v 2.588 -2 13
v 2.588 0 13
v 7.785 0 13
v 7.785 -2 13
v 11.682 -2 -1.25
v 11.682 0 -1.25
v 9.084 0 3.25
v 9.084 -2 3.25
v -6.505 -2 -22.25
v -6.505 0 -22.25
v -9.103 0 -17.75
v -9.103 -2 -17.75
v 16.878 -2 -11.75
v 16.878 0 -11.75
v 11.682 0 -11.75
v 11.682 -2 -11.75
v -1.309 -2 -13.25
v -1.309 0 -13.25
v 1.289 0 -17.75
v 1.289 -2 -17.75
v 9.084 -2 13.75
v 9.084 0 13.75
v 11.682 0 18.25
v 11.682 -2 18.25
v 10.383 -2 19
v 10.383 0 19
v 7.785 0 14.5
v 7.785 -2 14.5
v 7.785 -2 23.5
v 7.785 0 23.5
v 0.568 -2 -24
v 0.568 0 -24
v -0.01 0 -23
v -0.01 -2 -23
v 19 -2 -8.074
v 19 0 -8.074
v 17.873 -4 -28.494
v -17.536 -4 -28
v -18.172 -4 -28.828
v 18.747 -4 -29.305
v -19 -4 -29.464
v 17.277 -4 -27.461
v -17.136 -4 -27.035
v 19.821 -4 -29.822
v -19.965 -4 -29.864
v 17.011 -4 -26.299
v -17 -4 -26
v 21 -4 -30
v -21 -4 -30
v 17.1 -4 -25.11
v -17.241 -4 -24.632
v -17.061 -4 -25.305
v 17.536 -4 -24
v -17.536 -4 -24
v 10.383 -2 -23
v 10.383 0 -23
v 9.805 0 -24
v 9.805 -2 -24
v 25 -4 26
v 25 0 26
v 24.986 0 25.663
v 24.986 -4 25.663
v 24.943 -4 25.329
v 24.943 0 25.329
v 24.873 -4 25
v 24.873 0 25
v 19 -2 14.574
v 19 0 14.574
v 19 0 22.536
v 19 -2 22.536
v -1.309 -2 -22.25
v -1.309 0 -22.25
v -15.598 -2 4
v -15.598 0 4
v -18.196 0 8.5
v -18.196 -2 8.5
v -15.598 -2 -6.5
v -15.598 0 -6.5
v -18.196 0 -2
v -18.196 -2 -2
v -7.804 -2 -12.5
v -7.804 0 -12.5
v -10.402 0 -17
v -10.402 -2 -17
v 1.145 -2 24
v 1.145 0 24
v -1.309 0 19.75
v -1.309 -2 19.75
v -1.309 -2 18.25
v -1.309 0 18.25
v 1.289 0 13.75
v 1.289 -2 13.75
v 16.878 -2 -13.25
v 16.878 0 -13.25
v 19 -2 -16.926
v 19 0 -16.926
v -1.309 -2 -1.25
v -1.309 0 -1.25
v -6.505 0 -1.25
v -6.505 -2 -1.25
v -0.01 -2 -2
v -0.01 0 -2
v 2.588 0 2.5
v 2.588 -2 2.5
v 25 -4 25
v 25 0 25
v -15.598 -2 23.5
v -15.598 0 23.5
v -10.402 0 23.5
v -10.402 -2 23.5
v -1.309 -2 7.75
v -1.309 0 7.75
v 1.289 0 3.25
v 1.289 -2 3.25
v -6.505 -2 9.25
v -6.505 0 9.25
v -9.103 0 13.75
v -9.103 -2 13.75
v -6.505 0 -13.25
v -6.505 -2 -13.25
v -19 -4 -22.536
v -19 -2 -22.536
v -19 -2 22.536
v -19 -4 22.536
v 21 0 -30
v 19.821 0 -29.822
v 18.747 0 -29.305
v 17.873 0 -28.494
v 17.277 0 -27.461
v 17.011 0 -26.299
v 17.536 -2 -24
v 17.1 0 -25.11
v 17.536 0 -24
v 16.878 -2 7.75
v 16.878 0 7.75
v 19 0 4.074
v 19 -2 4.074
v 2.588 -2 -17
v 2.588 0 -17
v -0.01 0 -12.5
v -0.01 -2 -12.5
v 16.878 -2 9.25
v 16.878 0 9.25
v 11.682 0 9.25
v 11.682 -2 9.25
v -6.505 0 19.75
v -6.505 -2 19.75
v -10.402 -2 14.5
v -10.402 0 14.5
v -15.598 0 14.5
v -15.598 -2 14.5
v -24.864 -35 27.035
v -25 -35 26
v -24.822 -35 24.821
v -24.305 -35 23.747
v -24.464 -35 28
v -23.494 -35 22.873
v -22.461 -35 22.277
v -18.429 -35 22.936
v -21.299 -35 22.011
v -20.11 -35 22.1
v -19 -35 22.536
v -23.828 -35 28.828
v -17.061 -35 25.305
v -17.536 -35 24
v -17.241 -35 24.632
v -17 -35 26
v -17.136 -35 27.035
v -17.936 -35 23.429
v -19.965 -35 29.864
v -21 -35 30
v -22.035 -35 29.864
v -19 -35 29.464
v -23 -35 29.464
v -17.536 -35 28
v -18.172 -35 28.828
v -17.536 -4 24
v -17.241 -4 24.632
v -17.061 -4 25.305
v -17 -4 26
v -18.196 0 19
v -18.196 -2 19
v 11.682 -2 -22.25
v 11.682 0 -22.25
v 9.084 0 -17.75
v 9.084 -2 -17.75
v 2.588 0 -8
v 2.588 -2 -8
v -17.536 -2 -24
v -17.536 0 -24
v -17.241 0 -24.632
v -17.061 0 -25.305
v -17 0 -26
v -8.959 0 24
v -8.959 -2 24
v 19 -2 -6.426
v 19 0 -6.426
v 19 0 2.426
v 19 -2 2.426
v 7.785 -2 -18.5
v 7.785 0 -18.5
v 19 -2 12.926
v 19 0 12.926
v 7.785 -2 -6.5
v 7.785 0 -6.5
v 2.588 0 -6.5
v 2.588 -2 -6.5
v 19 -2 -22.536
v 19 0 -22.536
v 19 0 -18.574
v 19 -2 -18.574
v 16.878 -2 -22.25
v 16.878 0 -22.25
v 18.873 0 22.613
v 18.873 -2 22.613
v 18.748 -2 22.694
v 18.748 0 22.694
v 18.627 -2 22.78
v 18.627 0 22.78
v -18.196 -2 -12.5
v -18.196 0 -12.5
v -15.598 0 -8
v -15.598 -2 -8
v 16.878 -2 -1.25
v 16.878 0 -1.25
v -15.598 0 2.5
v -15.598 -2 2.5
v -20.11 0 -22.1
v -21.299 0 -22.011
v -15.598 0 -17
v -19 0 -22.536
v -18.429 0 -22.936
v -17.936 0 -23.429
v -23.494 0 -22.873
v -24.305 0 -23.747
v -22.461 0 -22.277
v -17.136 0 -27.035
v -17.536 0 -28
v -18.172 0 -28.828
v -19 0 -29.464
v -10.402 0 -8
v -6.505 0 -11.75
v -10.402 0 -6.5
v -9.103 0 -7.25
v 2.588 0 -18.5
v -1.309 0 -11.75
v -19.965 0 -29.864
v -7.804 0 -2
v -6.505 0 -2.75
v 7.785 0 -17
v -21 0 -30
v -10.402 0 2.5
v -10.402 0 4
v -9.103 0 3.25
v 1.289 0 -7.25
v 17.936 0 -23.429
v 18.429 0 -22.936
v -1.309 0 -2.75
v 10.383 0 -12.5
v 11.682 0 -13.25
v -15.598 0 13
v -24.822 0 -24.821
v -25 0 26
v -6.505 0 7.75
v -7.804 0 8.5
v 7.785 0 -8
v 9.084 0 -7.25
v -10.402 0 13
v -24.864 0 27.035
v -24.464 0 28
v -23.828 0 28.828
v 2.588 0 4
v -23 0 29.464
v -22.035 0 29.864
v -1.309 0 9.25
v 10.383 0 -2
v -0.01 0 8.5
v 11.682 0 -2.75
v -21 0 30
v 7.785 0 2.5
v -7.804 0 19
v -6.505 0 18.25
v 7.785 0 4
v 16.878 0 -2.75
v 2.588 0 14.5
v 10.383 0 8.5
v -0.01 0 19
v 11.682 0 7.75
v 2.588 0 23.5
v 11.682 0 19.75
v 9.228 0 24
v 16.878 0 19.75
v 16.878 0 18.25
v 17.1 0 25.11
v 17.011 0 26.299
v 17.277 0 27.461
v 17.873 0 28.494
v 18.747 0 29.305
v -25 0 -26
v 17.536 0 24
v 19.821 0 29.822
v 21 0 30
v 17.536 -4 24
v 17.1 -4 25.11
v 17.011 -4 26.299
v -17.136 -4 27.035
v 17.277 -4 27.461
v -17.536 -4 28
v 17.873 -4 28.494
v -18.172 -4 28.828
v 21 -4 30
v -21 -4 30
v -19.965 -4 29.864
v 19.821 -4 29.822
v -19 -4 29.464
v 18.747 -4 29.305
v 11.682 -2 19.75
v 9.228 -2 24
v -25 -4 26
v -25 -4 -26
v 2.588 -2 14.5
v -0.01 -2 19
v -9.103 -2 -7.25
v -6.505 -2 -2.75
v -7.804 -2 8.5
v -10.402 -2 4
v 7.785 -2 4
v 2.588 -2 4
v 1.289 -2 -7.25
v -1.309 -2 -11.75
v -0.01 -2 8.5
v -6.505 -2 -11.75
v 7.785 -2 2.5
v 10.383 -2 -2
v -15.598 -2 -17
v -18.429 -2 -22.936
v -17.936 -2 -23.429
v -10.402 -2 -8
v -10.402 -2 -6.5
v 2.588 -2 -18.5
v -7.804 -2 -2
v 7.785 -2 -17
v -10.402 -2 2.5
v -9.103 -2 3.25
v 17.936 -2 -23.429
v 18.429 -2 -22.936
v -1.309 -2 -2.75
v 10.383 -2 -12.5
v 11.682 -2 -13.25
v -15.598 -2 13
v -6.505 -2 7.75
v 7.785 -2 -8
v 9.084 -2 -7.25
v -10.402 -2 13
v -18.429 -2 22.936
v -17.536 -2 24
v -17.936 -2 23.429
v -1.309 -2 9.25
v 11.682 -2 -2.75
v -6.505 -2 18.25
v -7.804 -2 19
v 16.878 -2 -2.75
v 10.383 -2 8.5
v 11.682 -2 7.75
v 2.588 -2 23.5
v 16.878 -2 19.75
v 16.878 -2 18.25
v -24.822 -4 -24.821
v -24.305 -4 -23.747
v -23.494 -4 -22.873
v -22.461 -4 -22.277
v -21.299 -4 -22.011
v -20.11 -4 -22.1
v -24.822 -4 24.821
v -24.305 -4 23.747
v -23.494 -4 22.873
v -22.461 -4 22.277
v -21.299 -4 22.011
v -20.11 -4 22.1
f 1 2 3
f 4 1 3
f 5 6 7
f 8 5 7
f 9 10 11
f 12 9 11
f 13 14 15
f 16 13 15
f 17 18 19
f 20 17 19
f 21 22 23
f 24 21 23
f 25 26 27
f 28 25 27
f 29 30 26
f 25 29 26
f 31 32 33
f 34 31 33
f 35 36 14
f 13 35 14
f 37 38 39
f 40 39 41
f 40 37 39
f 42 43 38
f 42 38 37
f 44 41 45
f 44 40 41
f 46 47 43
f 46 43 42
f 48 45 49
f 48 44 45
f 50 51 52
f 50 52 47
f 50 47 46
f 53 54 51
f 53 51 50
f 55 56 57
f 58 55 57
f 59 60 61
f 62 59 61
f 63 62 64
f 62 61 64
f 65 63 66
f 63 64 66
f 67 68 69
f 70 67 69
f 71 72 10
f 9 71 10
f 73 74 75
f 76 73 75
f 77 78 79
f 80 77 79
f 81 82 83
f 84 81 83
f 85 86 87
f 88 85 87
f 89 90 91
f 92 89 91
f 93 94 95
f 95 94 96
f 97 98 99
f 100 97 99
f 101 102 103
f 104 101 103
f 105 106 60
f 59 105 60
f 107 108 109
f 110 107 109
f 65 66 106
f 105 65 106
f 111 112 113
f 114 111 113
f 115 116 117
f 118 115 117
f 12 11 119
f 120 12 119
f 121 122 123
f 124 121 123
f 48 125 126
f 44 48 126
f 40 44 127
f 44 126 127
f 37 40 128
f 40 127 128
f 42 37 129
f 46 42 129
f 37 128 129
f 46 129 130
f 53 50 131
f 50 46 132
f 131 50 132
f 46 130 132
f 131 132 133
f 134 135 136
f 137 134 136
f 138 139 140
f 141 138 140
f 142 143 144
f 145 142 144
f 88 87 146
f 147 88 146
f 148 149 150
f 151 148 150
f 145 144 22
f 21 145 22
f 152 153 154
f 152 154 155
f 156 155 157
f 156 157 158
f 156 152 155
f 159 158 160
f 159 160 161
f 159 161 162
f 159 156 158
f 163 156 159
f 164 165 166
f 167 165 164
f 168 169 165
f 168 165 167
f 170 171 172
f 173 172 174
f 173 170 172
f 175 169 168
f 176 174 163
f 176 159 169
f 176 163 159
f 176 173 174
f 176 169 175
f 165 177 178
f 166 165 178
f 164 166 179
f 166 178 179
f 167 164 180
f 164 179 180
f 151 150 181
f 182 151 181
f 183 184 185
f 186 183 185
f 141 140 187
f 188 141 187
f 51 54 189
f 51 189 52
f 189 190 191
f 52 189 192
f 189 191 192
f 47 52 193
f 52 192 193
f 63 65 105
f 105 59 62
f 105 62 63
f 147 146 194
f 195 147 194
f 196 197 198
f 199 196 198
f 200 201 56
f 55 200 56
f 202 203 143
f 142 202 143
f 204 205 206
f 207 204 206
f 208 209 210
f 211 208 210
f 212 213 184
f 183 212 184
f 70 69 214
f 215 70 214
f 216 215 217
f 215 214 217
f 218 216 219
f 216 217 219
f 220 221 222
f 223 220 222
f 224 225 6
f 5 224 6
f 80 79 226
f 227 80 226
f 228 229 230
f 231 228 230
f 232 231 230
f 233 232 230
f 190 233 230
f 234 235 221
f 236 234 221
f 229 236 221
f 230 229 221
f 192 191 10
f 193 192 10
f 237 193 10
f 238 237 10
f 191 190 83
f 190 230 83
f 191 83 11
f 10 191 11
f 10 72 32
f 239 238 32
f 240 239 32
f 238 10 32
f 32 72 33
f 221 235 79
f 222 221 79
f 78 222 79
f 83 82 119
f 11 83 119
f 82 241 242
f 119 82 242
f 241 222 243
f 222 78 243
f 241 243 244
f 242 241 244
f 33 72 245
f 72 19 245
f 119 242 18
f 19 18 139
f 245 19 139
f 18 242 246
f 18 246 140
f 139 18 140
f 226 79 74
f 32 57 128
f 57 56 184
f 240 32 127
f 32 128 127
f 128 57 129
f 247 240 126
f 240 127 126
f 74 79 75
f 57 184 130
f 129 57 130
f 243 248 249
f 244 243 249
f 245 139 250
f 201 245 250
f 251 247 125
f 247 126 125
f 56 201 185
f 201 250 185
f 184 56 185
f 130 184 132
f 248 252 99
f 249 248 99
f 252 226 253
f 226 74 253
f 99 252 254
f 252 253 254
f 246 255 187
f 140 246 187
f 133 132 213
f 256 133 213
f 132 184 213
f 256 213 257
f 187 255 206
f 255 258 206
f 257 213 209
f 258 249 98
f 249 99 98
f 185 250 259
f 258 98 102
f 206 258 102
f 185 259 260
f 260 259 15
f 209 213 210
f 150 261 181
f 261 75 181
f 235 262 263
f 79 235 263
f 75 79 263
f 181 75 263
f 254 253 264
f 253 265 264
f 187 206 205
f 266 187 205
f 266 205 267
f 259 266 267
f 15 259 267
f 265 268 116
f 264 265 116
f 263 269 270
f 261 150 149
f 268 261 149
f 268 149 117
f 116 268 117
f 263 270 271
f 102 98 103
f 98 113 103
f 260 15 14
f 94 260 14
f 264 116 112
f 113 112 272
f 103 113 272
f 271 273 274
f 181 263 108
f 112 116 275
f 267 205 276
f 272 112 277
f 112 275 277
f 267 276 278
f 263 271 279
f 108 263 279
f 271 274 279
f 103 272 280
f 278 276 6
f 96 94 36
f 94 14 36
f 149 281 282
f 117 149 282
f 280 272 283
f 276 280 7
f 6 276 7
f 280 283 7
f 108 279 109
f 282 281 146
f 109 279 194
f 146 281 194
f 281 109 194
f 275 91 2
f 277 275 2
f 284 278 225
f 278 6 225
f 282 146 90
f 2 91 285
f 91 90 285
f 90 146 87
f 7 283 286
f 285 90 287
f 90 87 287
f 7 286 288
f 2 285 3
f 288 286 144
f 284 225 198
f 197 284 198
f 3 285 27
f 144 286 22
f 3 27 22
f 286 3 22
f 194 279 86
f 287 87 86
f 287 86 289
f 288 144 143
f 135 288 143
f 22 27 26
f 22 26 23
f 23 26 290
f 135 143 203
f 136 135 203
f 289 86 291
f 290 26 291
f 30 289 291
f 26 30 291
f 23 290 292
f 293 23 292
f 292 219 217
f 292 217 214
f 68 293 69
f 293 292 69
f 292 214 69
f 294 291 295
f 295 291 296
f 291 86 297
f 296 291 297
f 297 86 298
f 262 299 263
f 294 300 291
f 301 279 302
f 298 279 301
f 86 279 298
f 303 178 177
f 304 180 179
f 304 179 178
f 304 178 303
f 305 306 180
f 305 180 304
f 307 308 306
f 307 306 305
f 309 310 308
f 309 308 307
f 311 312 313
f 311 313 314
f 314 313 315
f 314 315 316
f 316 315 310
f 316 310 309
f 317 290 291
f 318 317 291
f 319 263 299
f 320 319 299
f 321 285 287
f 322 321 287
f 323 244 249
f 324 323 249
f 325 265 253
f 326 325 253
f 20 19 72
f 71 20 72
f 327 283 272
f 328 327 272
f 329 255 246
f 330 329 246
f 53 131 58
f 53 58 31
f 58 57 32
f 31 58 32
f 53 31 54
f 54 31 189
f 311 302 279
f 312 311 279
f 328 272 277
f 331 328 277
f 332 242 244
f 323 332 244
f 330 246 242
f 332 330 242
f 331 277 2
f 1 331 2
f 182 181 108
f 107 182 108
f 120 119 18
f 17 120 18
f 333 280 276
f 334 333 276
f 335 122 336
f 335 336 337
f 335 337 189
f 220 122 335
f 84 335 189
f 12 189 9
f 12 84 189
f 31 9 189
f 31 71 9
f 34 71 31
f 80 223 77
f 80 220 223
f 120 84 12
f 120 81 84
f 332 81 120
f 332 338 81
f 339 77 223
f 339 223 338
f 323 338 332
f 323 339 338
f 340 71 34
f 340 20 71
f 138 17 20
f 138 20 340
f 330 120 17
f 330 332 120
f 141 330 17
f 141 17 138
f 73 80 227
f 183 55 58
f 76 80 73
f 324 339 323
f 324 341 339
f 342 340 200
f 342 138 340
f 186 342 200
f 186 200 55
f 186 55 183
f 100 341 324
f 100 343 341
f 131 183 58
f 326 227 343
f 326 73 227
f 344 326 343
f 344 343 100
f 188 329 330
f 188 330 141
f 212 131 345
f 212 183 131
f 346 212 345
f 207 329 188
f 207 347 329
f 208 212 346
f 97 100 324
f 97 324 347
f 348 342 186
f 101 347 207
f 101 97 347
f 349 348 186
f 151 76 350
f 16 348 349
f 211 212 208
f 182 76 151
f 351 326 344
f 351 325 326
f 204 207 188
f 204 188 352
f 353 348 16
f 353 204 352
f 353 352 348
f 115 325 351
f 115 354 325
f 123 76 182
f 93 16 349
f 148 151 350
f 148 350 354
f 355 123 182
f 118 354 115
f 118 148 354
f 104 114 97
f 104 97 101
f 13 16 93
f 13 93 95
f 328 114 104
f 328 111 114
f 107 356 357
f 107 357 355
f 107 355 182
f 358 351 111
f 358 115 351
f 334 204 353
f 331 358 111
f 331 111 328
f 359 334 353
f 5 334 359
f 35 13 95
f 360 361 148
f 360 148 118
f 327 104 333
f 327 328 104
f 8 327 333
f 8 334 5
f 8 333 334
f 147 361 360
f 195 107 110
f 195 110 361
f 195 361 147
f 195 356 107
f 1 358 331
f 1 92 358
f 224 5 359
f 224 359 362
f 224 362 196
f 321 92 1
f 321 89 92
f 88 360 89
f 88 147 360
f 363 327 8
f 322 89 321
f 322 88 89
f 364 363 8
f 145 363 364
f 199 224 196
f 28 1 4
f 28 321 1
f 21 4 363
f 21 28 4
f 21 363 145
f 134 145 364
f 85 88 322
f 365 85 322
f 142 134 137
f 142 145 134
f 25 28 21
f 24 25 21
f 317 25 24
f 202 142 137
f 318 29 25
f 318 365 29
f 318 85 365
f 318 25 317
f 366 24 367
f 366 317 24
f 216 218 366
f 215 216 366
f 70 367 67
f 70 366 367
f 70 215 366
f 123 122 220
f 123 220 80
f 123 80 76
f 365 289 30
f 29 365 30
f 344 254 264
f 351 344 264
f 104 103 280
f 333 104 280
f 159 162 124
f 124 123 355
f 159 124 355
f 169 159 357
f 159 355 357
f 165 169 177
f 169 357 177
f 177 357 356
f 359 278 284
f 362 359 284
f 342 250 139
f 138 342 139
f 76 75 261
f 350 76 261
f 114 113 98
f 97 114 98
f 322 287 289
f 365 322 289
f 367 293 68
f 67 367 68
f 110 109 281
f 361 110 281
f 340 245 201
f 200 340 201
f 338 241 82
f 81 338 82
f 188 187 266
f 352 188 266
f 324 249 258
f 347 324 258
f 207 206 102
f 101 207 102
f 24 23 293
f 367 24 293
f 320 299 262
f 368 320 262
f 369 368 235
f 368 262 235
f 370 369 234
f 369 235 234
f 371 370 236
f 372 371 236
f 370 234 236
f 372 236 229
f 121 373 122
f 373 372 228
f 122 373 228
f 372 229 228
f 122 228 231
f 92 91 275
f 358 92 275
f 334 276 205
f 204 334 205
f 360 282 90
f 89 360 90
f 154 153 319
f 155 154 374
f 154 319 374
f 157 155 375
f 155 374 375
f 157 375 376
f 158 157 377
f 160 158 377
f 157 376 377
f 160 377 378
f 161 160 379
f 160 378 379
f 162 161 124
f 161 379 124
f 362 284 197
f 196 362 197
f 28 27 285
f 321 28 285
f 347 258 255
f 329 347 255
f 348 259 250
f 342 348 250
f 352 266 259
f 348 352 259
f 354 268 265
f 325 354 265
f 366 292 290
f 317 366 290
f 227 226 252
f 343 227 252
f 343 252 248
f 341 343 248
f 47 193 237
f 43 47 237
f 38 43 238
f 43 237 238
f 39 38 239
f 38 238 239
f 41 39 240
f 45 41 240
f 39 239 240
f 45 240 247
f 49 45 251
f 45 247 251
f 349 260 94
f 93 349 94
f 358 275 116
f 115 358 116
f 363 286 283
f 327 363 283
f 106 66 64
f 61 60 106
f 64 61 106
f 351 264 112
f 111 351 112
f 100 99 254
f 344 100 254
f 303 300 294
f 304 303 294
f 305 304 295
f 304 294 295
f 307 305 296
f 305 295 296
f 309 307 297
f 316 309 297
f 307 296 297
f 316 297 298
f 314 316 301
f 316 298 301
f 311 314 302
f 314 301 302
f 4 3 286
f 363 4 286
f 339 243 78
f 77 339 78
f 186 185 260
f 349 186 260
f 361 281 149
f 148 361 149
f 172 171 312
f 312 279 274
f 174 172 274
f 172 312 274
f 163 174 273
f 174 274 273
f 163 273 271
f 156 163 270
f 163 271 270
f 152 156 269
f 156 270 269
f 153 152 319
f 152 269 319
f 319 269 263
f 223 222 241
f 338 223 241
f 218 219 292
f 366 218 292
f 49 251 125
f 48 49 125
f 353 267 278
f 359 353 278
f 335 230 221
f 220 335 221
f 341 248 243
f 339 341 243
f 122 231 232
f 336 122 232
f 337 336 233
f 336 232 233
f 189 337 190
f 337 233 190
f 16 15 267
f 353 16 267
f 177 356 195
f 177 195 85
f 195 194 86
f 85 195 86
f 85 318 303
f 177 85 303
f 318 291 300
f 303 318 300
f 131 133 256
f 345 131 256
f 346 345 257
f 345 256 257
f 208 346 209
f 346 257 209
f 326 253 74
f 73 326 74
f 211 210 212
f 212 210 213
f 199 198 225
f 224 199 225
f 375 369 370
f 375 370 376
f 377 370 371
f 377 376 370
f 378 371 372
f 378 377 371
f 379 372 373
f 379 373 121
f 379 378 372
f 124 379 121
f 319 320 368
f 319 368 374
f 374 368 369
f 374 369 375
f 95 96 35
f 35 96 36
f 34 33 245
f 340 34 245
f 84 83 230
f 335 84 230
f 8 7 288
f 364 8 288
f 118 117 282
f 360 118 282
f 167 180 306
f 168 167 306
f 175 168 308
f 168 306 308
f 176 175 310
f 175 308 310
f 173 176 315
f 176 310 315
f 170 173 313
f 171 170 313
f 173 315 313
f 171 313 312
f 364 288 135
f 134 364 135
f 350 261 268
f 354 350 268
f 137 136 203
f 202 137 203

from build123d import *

# Parameters (mm, degrees)
F1_DEPTH = 2
F2_DEPTH = 4
F3_DEPTH = 35


# Not quite as in the source:
# - a feature of the source that left no trace in its solid (it failed there, or was rolled back) is left out
# - a feature names something its author has since deleted; it is built from what else it names


with BuildPart() as f1:
    # F0 (on Front) → F1 (new body)
    with BuildSketch(Plane.XZ):
        with BuildLine():
            Line((-8.9585481157, 24), (-17.5358983849, 24))
            ThreePointArc((-17.5358983849, 24), (-18.1715728753, 23.1715728753), (-19, 22.5358983849))
            Line((-19, 22.5358983849), (-19, -22.5358983849))
            ThreePointArc((-19, -22.5358983849), (-18.1715728753, -23.1715728753), (-17.5358983849, -24))
            Line((-17.5358983849, -24), (-8.3811978465, -24))
            Line((-8.3811978465, -24), (0.567731326, -24))
            Line((0.567731326, -24), (-0.0096189432, -23))
            Line((-0.0096189432, -23), (2.5884572681, -18.5))
            Line((2.5884572681, -18.5), (7.7846096908, -18.5))
            Line((7.7846096908, -18.5), (10.3826859022, -23))
            Line((10.3826859022, -23), (9.805335633, -24))
            Line((9.805335633, -24), (17.5358983849, -24))
            ThreePointArc((17.5358983849, -24), (18.1715728753, -23.1715728753), (19, -22.5358983849))
            Line((19, -22.5358983849), (19, -18.5743741578))
            Line((19, -18.5743741578), (16.8778764306, -22.25))
            Line((16.8778764306, -22.25), (11.6817240079, -22.25))
            Line((11.6817240079, -22.25), (9.0836477965, -17.75))
            Line((9.0836477965, -17.75), (11.6817240079, -13.25))
            Line((11.6817240079, -13.25), (16.8778764306, -13.25))
            Line((16.8778764306, -13.25), (19, -16.9256258422))
            Line((19, -16.9256258422), (19, -8.0743741578))
            Line((19, -8.0743741578), (16.8778764306, -11.75))
            Line((16.8778764306, -11.75), (11.6817240079, -11.75))
            Line((11.6817240079, -11.75), (9.0836477965, -7.25))
            Line((9.0836477965, -7.25), (11.6817240079, -2.75))
            Line((11.6817240079, -2.75), (16.8778764306, -2.75))
            Line((16.8778764306, -2.75), (19, -6.4256258422))
            Line((19, -6.4256258422), (19, 2.4256258422))
            Line((19, 2.4256258422), (16.8778764306, -1.25))
            Line((16.8778764306, -1.25), (11.6817240079, -1.25))
            Line((11.6817240079, -1.25), (9.0836477965, 3.25))
            Line((9.0836477965, 3.25), (11.6817240079, 7.75))
            Line((11.6817240079, 7.75), (16.8778764306, 7.75))
            Line((16.8778764306, 7.75), (19, 4.0743741578))
            Line((19, 4.0743741578), (19, 12.9256258422))
            Line((19, 12.9256258422), (16.8778764306, 9.25))
            Line((16.8778764306, 9.25), (11.6817240079, 9.25))
            Line((11.6817240079, 9.25), (9.0836477965, 13.75))
            Line((9.0836477965, 13.75), (11.6817240079, 18.25))
            Line((11.6817240079, 18.25), (16.8778764306, 18.25))
            Line((16.8778764306, 18.25), (19, 14.5743741578))
            Line((19, 14.5743741578), (19, 22.5358983849))
            ThreePointArc((19, 22.5358983849), (18.8101731757, 22.6526639727), (18.6271441796, 22.7798206174))
            Line((18.6271441796, 22.7798206174), (16.8778764306, 19.75))
            Line((16.8778764306, 19.75), (11.6817240079, 19.75))
            Line((11.6817240079, 19.75), (9.2279853638, 24))
            Line((9.2279853638, 24), (1.1450815951, 24))
            Line((1.1450815951, 24), (-1.3086570489, 19.75))
            Line((-1.3086570489, 19.75), (-6.5048094716, 19.75))
            Line((-6.5048094716, 19.75), (-8.9585481157, 24))
        make_face()
        Polygon((1.2894191624, -17.75), (-1.3086570489, -22.25), (-6.5048094716, -22.25), (-9.102885683, -17.75), (-6.5048094716, -13.25), (-1.3086570489, -13.25), align=None, mode=Mode.SUBTRACT)
        Polygon((-7.8038475773, -12.5), (-10.4019237886, -17), (-15.5980762114, -17), (-18.1961524227, -12.5), (-15.5980762114, -8), (-10.4019237886, -8), align=None, mode=Mode.SUBTRACT)
        Polygon((-7.8038475773, -2), (-10.4019237886, -6.5), (-15.5980762114, -6.5), (-18.1961524227, -2), (-15.5980762114, 2.5), (-10.4019237886, 2.5), align=None, mode=Mode.SUBTRACT)
        Polygon((1.2894191624, -7.25), (-1.3086570489, -11.75), (-6.5048094716, -11.75), (-9.102885683, -7.25), (-6.5048094716, -2.75), (-1.3086570489, -2.75), align=None, mode=Mode.SUBTRACT)
        Polygon((10.3826859022, -12.5), (7.7846096908, -17), (2.5884572681, -17), (-0.0096189432, -12.5), (2.5884572681, -8), (7.7846096908, -8), align=None, mode=Mode.SUBTRACT)
        Polygon((10.3826859022, -2), (7.7846096908, -6.5), (2.5884572681, -6.5), (-0.0096189432, -2), (2.5884572681, 2.5), (7.7846096908, 2.5), align=None, mode=Mode.SUBTRACT)
        Polygon((-7.8038475773, 8.5), (-10.4019237886, 4), (-15.5980762114, 4), (-18.1961524227, 8.5), (-15.5980762114, 13), (-10.4019237886, 13), align=None, mode=Mode.SUBTRACT)
        Polygon((1.2894191624, 3.25), (-1.3086570489, -1.25), (-6.5048094716, -1.25), (-9.102885683, 3.25), (-6.5048094716, 7.75), (-1.3086570489, 7.75), align=None, mode=Mode.SUBTRACT)
        Polygon((1.2894191624, 13.75), (-1.3086570489, 9.25), (-6.5048094716, 9.25), (-9.102885683, 13.75), (-6.5048094716, 18.25), (-1.3086570489, 18.25), align=None, mode=Mode.SUBTRACT)
        Polygon((-10.4019237886, 23.5), (-7.8038475773, 19), (-10.4019237886, 14.5), (-15.5980762114, 14.5), (-18.1961524227, 19), (-15.5980762114, 23.5), align=None, mode=Mode.SUBTRACT)
        Polygon((10.3826859022, 8.5), (7.7846096908, 4), (2.5884572681, 4), (-0.0096189432, 8.5), (2.5884572681, 13), (7.7846096908, 13), align=None, mode=Mode.SUBTRACT)
        Polygon((10.3826859022, 19), (7.7846096908, 14.5), (2.5884572681, 14.5), (-0.0096189432, 19), (2.5884572681, 23.5), (7.7846096908, 23.5), align=None, mode=Mode.SUBTRACT)
    extrude(amount=F1_DEPTH)

    # F0 (on Front) → F2, piece 2 (join)
    with BuildSketch(Plane.XZ):
        with BuildLine():
            Line((21, 30), (-21, 30))
            ThreePointArc((-21, 30), (-18.1715728753, 28.8284271247), (-17, 26))
            ThreePointArc((-17, 26), (-17.1362966948, 24.9647238196), (-17.5358983849, 24))
            Line((-17.5358983849, 24), (-8.9585481157, 24))
            Line((-8.9585481157, 24), (1.1450815951, 24))
            Line((1.1450815951, 24), (9.2279853638, 24))
            Line((9.2279853638, 24), (17.5358983849, 24))
            ThreePointArc((17.5358983849, 24), (17.5358983849, 28), (21, 30))
        make_face()
        with BuildLine():
            ThreePointArc((-19, 22.5358983849), (-23, 22.5358983849), (-25, 26))
            Line((-25, 26), (-25, -26))
            ThreePointArc((-25, -26), (-23, -22.5358983849), (-19, -22.5358983849))
            Line((-19, -22.5358983849), (-19, 22.5358983849))
        make_face()
        with BuildLine():
            ThreePointArc((-17, -26), (-18.1715728753, -28.8284271247), (-21, -30))
            Line((-21, -30), (21, -30))
            ThreePointArc((21, -30), (17.5358983849, -28), (17.5358983849, -24))
            Line((17.5358983849, -24), (9.805335633, -24))
            Line((9.805335633, -24), (0.567731326, -24))
            Line((0.567731326, -24), (-8.3811978465, -24))
            Line((-8.3811978465, -24), (-17.5358983849, -24))
            ThreePointArc((-17.5358983849, -24), (-17.1362966948, -24.9647238196), (-17, -26))
        make_face()
    extrude(amount=F2_DEPTH)

    # F0 (on Front) → F3 (join)
    with BuildSketch(Plane.XZ):
        with BuildLine():
            ThreePointArc((-17, 26), (-18.1715728753, 28.8284271247), (-21, 30))
            ThreePointArc((-21, 30), (-23.8284271247, 28.8284271247), (-25, 26))
            ThreePointArc((-25, 26), (-23, 22.5358983849), (-19, 22.5358983849))
            ThreePointArc((-19, 22.5358983849), (-18.1715728753, 23.1715728753), (-17.5358983849, 24))
            ThreePointArc((-17.5358983849, 24), (-17.1362966948, 24.9647238196), (-17, 26))
        make_face()
    extrude(amount=F3_DEPTH)


with BuildPart() as f2:
    # F0 (on Front) → F2 (new body)
    with BuildSketch(Plane.XZ):
        with BuildLine():
            Line((25, 25), (25, 26))
            ThreePointArc((25, 26), (24.9681187851, 25.4959828301), (24.8729833462, 25))
            Line((24.8729833462, 25), (25, 25))
        make_face()
    extrude(amount=F2_DEPTH)


solid = Compound([f1.part, f2.part])
